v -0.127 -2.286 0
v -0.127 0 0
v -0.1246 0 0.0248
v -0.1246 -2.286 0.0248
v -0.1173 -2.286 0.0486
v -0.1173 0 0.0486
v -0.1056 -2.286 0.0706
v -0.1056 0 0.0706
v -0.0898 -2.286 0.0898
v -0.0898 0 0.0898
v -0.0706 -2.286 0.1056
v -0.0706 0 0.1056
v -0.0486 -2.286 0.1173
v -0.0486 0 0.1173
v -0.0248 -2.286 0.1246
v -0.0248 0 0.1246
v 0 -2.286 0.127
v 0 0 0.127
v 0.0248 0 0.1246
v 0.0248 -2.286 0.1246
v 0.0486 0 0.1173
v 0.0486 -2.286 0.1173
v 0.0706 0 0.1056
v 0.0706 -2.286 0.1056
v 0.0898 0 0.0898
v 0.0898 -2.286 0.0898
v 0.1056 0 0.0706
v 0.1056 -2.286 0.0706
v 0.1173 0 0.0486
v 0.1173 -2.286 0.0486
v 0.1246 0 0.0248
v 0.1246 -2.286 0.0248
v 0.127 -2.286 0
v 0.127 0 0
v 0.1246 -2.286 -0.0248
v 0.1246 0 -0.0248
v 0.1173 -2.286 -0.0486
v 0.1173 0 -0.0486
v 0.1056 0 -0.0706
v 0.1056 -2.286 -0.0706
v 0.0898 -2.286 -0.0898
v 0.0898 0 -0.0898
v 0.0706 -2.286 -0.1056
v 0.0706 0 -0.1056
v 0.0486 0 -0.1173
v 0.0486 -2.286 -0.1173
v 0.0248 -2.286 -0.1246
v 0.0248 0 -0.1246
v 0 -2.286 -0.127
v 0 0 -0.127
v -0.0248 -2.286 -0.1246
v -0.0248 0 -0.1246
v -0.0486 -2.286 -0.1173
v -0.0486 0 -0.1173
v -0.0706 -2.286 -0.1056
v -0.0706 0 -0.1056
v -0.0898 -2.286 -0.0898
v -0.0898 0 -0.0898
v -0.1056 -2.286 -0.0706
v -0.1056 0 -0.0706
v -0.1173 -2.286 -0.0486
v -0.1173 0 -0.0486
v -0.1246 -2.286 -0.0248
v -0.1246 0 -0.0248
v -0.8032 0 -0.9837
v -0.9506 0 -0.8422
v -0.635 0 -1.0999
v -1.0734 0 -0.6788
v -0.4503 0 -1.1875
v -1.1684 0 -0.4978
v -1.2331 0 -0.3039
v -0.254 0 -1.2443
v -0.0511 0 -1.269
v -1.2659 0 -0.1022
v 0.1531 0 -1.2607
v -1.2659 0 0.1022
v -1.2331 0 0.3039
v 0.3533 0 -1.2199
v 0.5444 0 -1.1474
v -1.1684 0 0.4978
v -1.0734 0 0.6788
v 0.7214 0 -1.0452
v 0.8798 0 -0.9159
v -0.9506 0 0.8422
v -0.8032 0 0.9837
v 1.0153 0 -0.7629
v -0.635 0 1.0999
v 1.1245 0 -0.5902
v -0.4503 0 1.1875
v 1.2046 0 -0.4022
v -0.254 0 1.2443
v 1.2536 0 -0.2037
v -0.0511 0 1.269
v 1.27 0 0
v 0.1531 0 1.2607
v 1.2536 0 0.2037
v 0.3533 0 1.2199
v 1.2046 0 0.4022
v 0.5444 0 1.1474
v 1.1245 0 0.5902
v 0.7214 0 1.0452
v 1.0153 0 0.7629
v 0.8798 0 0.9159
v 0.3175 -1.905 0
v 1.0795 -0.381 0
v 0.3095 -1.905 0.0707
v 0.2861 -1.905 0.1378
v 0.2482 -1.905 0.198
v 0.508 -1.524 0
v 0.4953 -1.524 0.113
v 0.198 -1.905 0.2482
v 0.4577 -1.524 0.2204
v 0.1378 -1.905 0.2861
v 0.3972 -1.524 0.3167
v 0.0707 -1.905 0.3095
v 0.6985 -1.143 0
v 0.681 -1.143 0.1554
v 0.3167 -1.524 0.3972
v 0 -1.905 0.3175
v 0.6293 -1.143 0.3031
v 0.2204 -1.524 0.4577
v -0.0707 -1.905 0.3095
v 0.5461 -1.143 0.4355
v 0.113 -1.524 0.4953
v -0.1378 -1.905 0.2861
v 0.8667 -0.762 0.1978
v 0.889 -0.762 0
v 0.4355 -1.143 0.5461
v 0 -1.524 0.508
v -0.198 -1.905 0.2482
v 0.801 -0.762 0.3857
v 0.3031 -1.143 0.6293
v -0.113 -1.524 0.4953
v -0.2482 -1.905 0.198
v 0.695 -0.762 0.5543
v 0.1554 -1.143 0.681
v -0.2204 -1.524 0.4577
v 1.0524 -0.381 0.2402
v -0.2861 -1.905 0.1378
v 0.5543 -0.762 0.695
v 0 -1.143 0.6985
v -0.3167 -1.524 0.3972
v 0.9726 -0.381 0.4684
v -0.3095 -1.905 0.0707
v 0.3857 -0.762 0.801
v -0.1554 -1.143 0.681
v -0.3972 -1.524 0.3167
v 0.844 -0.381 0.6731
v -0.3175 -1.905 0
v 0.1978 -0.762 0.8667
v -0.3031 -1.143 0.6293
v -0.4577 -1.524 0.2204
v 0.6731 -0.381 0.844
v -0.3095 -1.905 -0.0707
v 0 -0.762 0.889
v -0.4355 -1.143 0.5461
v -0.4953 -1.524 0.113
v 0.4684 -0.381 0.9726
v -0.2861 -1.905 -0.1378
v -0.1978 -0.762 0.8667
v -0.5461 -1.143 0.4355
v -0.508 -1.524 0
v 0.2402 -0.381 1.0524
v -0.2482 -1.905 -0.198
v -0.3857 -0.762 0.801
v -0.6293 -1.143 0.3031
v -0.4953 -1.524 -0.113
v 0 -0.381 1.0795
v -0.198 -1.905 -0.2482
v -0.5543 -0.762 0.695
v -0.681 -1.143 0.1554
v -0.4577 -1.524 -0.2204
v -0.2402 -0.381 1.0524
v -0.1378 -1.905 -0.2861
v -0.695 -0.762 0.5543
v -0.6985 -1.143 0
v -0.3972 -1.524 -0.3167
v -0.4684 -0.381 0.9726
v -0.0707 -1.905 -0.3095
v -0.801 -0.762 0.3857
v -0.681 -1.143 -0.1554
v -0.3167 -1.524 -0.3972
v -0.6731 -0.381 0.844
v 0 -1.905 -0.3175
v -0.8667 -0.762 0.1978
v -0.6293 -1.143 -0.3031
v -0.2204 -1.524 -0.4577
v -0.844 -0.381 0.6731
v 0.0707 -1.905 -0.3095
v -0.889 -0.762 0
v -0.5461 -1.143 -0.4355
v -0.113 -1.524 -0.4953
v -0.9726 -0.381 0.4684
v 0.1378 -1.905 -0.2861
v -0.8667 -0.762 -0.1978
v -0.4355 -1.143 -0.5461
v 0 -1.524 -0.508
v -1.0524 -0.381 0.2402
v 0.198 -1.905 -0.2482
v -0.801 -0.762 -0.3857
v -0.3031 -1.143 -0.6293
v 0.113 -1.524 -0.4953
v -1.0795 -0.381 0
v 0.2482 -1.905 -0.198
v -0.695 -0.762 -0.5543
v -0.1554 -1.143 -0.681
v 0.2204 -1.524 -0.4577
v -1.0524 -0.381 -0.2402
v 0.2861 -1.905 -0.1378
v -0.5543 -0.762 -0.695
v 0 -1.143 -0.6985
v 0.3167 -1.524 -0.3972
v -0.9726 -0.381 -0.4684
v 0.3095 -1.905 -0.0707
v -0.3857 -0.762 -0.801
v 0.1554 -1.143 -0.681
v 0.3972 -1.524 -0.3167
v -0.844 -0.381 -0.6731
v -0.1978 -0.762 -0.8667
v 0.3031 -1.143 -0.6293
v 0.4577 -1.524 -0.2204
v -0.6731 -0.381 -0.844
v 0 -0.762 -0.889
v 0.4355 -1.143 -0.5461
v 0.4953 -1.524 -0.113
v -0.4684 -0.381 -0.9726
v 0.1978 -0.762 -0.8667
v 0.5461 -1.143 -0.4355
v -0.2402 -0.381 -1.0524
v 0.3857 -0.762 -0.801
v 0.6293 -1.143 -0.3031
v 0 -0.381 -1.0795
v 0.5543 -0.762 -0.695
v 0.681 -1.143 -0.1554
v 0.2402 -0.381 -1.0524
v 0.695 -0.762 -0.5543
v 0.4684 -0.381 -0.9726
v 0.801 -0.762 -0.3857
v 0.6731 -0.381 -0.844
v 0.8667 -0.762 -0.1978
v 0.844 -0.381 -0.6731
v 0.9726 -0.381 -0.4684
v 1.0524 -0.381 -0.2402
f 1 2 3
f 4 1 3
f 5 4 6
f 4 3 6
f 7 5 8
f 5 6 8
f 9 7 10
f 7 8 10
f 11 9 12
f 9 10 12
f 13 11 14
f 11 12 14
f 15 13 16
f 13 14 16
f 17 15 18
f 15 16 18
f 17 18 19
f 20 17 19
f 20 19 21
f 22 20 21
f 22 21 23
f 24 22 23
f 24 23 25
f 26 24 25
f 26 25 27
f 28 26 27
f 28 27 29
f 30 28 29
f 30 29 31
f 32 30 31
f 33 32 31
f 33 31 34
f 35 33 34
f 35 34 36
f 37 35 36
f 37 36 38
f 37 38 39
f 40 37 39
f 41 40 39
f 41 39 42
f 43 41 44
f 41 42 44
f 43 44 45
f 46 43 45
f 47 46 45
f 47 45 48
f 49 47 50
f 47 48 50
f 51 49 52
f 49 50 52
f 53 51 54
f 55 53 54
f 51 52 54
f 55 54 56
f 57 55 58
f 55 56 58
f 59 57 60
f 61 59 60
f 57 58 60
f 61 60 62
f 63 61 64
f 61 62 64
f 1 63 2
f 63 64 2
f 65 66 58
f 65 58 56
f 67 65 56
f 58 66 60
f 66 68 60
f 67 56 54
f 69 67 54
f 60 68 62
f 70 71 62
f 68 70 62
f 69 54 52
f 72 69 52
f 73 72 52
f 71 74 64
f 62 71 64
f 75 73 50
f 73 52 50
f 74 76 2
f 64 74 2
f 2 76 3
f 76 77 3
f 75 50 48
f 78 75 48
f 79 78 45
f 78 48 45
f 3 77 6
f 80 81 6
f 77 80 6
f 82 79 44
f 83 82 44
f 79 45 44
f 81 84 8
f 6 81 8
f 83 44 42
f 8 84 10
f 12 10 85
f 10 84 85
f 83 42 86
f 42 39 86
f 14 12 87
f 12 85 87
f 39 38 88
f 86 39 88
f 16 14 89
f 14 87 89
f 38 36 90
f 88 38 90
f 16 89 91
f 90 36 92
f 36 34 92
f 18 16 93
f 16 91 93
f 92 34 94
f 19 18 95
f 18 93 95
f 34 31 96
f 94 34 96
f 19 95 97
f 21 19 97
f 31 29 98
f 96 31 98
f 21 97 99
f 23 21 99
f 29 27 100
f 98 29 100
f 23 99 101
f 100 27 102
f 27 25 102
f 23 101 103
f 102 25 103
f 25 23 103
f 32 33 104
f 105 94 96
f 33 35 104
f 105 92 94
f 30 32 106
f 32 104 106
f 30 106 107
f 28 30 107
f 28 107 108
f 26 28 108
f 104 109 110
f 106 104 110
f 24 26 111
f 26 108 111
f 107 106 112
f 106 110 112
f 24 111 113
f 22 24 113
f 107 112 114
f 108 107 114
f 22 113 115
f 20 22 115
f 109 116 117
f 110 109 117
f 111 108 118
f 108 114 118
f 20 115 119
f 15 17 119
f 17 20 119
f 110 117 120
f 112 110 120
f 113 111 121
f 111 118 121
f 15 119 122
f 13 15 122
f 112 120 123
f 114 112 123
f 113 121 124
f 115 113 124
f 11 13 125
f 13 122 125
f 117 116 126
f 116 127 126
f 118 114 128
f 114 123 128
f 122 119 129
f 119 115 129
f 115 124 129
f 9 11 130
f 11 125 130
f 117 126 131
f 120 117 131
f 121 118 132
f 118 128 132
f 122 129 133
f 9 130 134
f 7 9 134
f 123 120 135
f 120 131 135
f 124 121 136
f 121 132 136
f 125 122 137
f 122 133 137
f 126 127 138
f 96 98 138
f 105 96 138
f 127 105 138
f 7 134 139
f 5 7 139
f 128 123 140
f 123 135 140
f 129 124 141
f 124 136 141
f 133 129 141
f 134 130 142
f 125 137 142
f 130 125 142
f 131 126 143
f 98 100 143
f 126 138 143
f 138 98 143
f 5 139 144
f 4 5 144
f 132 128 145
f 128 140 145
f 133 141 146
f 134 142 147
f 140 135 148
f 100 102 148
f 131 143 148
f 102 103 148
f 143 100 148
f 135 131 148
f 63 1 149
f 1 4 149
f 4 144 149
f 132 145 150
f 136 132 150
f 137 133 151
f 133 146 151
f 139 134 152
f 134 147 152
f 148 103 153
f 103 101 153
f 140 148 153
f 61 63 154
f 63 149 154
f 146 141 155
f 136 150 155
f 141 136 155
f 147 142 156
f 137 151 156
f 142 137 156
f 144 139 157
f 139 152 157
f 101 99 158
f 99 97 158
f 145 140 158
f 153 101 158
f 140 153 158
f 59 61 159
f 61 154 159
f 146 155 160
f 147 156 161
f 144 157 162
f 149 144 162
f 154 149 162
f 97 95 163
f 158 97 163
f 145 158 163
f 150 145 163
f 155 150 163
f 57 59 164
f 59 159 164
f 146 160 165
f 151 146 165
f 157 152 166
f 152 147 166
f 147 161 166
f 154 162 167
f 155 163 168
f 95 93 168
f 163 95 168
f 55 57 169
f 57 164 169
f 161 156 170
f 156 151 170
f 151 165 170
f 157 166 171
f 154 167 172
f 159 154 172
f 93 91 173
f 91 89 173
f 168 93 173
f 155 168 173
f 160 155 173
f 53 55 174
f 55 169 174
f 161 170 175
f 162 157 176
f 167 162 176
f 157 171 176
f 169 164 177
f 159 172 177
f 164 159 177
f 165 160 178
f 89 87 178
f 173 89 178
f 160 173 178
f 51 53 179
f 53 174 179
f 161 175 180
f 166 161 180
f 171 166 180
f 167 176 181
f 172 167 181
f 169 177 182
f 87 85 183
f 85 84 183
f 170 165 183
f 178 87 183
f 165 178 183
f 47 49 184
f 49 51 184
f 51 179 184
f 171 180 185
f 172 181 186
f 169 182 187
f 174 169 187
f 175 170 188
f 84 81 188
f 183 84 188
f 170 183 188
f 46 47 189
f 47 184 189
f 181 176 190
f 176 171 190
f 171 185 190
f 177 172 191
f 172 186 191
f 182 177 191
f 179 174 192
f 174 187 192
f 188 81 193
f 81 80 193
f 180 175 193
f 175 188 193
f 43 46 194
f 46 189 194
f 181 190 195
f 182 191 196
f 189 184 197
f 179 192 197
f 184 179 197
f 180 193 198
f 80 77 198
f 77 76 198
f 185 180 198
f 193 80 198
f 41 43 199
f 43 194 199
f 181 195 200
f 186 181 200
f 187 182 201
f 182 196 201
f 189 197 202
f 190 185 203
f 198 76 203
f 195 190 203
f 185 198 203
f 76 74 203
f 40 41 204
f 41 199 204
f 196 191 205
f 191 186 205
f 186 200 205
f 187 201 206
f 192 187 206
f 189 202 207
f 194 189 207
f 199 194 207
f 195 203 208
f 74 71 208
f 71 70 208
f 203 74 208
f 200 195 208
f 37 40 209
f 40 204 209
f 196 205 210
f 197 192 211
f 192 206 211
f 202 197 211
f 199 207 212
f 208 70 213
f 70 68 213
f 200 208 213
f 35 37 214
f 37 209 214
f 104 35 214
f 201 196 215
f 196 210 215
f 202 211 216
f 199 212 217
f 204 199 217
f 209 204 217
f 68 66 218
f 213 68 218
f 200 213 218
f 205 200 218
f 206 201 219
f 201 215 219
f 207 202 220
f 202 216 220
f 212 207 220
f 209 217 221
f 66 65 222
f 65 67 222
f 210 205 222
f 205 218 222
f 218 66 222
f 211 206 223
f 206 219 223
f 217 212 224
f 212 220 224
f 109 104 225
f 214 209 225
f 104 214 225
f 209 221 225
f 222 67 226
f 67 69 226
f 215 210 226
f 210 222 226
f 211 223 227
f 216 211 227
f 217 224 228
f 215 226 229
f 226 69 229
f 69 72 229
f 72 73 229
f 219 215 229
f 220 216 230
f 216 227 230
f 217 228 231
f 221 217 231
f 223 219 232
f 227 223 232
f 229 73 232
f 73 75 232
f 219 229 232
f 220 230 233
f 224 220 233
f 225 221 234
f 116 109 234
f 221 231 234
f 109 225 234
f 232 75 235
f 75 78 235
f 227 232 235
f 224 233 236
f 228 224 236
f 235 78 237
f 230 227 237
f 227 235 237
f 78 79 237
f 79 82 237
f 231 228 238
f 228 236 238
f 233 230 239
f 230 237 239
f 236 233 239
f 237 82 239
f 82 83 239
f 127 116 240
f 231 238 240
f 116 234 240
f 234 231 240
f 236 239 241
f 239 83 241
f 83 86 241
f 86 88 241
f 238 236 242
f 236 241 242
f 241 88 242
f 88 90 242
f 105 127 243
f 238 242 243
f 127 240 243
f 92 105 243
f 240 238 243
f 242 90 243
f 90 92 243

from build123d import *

# Parameters (mm, degrees)
F0_R     = 1.27
F1_DEPTH = 2.54
F2_SIZE2 = 2.53999
F2_SIZE  = 1.26999
F3_R     = 0.127
F4_DEPTH = 2.541


# Not quite as in the source:
# - a fillet or chamfer is up to 0.001 mm smaller than in the source, because OpenCascade refuses the exact size


with BuildPart() as f1:
    # F0 (on Front) → F1 (new body)
    with BuildSketch(Plane.XZ):
        Circle(F0_R)
    extrude(amount=F1_DEPTH)

    # F2 (size 1.27 and 2.54 in the source; OpenCascade refuses exactly that, so slightly less here)
    f2_edges = [f1.edges().sort_by_distance(p)[0] for p in [
        (-1.27, -2.54, 0),
    ]]
    f2_side = f1.faces().sort_by_distance((0, -2.54, 0))[0]
    chamfer(f2_edges, length=F2_SIZE, length2=F2_SIZE2, reference=f2_side)

    # F3 (on face) → F4 (cut, through all)
    with BuildSketch(Plane(origin=(0, 0, 0), x_dir=(-1, 0, 0), z_dir=(0, 1, 0))):
        Circle(F3_R)
    extrude(amount=-F4_DEPTH, mode=Mode.SUBTRACT)


solid = f1.part
